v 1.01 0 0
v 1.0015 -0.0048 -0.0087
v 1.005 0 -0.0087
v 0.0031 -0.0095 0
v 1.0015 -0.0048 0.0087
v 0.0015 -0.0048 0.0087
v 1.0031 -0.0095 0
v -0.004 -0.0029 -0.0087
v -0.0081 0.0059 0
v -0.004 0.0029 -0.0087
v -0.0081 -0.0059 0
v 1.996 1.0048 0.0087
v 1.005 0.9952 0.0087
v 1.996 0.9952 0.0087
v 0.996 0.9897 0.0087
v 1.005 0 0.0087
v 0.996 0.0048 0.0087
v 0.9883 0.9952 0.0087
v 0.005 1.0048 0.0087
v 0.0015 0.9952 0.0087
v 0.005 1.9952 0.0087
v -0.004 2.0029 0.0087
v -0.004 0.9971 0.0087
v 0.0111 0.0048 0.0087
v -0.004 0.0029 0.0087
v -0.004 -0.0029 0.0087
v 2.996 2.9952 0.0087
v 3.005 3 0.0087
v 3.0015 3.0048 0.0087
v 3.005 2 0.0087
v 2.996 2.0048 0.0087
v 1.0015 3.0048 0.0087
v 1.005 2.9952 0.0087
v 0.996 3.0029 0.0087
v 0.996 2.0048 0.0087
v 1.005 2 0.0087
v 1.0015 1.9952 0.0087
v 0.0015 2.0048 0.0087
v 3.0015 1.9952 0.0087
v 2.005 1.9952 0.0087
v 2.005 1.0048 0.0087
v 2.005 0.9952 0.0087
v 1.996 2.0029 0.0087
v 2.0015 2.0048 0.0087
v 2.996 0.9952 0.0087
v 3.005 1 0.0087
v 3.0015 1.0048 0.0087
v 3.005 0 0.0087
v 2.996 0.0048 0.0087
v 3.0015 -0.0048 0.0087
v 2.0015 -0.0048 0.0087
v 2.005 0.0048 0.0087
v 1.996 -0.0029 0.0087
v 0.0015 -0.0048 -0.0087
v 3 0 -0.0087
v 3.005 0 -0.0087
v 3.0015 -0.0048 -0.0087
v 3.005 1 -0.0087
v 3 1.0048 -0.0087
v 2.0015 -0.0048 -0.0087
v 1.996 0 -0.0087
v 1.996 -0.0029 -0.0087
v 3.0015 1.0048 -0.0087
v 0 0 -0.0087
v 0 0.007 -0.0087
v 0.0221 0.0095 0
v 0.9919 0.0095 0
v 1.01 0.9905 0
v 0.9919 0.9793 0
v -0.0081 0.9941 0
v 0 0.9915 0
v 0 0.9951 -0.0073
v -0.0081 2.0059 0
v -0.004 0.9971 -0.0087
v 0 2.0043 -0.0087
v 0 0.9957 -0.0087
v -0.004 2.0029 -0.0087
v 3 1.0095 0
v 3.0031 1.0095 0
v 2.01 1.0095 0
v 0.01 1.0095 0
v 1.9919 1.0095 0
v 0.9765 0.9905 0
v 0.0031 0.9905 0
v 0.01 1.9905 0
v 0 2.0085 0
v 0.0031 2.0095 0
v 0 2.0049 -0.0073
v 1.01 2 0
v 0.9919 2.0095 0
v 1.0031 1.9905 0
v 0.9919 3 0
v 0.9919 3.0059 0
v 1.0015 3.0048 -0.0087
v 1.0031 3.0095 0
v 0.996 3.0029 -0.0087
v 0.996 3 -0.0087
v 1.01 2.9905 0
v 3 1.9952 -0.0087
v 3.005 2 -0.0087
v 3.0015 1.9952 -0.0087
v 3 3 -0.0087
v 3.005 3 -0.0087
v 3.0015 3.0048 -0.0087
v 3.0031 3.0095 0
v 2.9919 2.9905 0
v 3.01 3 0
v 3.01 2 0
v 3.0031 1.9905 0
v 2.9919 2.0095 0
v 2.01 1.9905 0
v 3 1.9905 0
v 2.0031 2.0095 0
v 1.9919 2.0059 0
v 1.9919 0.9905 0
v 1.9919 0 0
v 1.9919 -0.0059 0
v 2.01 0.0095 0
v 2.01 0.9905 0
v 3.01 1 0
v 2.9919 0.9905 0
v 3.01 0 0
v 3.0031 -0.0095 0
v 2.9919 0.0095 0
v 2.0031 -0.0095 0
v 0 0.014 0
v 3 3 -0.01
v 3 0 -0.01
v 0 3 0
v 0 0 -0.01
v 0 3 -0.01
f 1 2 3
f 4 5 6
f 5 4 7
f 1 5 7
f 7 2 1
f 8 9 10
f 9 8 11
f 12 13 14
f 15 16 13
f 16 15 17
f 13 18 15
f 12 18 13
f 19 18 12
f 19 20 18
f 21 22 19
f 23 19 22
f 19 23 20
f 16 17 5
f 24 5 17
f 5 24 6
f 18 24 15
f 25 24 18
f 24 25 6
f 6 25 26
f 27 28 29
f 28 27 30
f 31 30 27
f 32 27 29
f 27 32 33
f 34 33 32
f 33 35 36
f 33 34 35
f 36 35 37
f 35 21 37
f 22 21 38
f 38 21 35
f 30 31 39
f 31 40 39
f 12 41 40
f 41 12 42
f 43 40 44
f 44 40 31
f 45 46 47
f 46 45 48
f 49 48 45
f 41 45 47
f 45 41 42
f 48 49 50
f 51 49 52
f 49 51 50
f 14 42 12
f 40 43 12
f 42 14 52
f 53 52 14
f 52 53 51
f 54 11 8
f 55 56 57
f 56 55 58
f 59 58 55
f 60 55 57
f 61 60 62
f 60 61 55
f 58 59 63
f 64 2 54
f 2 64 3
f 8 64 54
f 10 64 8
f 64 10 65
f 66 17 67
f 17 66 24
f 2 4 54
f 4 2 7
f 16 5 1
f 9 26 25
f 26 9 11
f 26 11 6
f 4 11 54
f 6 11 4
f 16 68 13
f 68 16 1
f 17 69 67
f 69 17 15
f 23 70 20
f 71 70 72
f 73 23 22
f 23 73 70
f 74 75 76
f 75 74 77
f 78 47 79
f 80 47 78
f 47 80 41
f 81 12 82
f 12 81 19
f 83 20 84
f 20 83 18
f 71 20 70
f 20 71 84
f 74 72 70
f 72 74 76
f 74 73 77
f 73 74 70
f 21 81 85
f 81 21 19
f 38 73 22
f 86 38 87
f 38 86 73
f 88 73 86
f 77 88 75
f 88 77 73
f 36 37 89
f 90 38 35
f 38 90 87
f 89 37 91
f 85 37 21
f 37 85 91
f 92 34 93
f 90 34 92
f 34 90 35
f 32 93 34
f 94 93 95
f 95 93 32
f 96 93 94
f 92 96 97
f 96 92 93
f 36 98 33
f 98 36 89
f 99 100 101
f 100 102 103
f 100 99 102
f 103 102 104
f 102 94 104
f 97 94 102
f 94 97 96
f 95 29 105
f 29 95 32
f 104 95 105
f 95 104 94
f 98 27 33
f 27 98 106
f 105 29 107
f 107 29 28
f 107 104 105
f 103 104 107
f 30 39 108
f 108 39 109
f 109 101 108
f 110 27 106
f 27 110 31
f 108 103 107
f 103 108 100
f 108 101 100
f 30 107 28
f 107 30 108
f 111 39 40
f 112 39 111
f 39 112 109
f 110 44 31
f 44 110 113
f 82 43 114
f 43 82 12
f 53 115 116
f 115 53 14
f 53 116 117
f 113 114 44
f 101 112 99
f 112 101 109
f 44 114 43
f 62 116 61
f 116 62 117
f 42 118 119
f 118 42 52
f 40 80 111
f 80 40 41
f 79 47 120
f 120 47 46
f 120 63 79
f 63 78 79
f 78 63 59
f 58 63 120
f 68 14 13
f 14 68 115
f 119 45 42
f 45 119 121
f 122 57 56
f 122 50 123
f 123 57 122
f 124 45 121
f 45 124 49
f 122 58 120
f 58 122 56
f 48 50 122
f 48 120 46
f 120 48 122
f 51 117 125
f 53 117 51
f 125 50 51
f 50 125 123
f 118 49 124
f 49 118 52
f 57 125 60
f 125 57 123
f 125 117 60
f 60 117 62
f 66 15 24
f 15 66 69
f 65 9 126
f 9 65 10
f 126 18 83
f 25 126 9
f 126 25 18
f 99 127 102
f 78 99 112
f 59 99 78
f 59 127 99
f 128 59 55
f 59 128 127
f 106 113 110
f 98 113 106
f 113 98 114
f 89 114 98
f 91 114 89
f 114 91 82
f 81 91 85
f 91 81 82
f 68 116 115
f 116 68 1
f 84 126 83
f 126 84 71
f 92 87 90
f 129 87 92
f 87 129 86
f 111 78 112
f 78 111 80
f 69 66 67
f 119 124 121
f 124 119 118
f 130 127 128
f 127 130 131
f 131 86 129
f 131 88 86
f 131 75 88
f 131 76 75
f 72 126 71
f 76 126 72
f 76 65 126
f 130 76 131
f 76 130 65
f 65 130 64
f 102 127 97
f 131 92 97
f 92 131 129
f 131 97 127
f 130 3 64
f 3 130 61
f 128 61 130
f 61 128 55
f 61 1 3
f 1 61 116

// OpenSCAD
hull(){
    translate([0.0, 0.0]) sphere(0.01);
    translate([1.0, 0.0]) sphere(0.01);
}
hull(){
    translate([1.0, 0.0]) sphere(0.01);
    translate([1.0, 1.0]) sphere(0.01);
}
hull(){
    translate([1.0, 1.0]) sphere(0.01);
    translate([0.0, 1.0]) sphere(0.01);
}
hull(){
    translate([0.0, 1.0]) sphere(0.01);
    translate([0.0, 2.0]) sphere(0.01);
}
hull(){
    translate([0.0, 2.0]) sphere(0.01);
    translate([1.0, 2.0]) sphere(0.01);
}
hull(){
    translate([1.0, 2.0]) sphere(0.01);
    translate([1.0, 3.0]) sphere(0.01);
}
hull(){
    translate([1.0, 3.0]) sphere(0.01);
    translate([2.0, 3.0]) sphere(0.01);
}
hull(){
    translate([2.0, 3.0]) sphere(0.01);
    translate([3.0, 3.0]) sphere(0.01);
}
hull(){
    translate([3.0, 3.0]) sphere(0.01);
    translate([3.0, 2.0]) sphere(0.01);
}
hull(){
    translate([3.0, 2.0]) sphere(0.01);
    translate([2.0, 2.0]) sphere(0.01);
}
hull(){
    translate([2.0, 2.0]) sphere(0.01);
    translate([2.0, 1.0]) sphere(0.01);
}
hull(){
    translate([2.0, 1.0]) sphere(0.01);
    translate([3.0, 1.0]) sphere(0.01);
}
hull(){
    translate([3.0, 1.0]) sphere(0.01);
    translate([3.0, 0.0]) sphere(0.01);
}
hull(){
    translate([3.0, 0.0]) sphere(0.01);
    translate([2.0, 0.0]) sphere(0.01);
}
hull(){
    translate([2.0, 0.0]) sphere(0.01);
    translate([2.0, 1.0]) sphere(0.01);
}
hull(){
    translate([2.0, 1.0]) sphere(0.01);
    translate([1.0, 1.0]) sphere(0.01);
}
hull(){
    translate([1.0, 1.0]) sphere(0.01);
    translate([0.0, 0.0]) sphere(0.01);
}
translate([0,0,-0.01]) color([0.1,0.1,0.1]) cube([3,3,0.01]);
